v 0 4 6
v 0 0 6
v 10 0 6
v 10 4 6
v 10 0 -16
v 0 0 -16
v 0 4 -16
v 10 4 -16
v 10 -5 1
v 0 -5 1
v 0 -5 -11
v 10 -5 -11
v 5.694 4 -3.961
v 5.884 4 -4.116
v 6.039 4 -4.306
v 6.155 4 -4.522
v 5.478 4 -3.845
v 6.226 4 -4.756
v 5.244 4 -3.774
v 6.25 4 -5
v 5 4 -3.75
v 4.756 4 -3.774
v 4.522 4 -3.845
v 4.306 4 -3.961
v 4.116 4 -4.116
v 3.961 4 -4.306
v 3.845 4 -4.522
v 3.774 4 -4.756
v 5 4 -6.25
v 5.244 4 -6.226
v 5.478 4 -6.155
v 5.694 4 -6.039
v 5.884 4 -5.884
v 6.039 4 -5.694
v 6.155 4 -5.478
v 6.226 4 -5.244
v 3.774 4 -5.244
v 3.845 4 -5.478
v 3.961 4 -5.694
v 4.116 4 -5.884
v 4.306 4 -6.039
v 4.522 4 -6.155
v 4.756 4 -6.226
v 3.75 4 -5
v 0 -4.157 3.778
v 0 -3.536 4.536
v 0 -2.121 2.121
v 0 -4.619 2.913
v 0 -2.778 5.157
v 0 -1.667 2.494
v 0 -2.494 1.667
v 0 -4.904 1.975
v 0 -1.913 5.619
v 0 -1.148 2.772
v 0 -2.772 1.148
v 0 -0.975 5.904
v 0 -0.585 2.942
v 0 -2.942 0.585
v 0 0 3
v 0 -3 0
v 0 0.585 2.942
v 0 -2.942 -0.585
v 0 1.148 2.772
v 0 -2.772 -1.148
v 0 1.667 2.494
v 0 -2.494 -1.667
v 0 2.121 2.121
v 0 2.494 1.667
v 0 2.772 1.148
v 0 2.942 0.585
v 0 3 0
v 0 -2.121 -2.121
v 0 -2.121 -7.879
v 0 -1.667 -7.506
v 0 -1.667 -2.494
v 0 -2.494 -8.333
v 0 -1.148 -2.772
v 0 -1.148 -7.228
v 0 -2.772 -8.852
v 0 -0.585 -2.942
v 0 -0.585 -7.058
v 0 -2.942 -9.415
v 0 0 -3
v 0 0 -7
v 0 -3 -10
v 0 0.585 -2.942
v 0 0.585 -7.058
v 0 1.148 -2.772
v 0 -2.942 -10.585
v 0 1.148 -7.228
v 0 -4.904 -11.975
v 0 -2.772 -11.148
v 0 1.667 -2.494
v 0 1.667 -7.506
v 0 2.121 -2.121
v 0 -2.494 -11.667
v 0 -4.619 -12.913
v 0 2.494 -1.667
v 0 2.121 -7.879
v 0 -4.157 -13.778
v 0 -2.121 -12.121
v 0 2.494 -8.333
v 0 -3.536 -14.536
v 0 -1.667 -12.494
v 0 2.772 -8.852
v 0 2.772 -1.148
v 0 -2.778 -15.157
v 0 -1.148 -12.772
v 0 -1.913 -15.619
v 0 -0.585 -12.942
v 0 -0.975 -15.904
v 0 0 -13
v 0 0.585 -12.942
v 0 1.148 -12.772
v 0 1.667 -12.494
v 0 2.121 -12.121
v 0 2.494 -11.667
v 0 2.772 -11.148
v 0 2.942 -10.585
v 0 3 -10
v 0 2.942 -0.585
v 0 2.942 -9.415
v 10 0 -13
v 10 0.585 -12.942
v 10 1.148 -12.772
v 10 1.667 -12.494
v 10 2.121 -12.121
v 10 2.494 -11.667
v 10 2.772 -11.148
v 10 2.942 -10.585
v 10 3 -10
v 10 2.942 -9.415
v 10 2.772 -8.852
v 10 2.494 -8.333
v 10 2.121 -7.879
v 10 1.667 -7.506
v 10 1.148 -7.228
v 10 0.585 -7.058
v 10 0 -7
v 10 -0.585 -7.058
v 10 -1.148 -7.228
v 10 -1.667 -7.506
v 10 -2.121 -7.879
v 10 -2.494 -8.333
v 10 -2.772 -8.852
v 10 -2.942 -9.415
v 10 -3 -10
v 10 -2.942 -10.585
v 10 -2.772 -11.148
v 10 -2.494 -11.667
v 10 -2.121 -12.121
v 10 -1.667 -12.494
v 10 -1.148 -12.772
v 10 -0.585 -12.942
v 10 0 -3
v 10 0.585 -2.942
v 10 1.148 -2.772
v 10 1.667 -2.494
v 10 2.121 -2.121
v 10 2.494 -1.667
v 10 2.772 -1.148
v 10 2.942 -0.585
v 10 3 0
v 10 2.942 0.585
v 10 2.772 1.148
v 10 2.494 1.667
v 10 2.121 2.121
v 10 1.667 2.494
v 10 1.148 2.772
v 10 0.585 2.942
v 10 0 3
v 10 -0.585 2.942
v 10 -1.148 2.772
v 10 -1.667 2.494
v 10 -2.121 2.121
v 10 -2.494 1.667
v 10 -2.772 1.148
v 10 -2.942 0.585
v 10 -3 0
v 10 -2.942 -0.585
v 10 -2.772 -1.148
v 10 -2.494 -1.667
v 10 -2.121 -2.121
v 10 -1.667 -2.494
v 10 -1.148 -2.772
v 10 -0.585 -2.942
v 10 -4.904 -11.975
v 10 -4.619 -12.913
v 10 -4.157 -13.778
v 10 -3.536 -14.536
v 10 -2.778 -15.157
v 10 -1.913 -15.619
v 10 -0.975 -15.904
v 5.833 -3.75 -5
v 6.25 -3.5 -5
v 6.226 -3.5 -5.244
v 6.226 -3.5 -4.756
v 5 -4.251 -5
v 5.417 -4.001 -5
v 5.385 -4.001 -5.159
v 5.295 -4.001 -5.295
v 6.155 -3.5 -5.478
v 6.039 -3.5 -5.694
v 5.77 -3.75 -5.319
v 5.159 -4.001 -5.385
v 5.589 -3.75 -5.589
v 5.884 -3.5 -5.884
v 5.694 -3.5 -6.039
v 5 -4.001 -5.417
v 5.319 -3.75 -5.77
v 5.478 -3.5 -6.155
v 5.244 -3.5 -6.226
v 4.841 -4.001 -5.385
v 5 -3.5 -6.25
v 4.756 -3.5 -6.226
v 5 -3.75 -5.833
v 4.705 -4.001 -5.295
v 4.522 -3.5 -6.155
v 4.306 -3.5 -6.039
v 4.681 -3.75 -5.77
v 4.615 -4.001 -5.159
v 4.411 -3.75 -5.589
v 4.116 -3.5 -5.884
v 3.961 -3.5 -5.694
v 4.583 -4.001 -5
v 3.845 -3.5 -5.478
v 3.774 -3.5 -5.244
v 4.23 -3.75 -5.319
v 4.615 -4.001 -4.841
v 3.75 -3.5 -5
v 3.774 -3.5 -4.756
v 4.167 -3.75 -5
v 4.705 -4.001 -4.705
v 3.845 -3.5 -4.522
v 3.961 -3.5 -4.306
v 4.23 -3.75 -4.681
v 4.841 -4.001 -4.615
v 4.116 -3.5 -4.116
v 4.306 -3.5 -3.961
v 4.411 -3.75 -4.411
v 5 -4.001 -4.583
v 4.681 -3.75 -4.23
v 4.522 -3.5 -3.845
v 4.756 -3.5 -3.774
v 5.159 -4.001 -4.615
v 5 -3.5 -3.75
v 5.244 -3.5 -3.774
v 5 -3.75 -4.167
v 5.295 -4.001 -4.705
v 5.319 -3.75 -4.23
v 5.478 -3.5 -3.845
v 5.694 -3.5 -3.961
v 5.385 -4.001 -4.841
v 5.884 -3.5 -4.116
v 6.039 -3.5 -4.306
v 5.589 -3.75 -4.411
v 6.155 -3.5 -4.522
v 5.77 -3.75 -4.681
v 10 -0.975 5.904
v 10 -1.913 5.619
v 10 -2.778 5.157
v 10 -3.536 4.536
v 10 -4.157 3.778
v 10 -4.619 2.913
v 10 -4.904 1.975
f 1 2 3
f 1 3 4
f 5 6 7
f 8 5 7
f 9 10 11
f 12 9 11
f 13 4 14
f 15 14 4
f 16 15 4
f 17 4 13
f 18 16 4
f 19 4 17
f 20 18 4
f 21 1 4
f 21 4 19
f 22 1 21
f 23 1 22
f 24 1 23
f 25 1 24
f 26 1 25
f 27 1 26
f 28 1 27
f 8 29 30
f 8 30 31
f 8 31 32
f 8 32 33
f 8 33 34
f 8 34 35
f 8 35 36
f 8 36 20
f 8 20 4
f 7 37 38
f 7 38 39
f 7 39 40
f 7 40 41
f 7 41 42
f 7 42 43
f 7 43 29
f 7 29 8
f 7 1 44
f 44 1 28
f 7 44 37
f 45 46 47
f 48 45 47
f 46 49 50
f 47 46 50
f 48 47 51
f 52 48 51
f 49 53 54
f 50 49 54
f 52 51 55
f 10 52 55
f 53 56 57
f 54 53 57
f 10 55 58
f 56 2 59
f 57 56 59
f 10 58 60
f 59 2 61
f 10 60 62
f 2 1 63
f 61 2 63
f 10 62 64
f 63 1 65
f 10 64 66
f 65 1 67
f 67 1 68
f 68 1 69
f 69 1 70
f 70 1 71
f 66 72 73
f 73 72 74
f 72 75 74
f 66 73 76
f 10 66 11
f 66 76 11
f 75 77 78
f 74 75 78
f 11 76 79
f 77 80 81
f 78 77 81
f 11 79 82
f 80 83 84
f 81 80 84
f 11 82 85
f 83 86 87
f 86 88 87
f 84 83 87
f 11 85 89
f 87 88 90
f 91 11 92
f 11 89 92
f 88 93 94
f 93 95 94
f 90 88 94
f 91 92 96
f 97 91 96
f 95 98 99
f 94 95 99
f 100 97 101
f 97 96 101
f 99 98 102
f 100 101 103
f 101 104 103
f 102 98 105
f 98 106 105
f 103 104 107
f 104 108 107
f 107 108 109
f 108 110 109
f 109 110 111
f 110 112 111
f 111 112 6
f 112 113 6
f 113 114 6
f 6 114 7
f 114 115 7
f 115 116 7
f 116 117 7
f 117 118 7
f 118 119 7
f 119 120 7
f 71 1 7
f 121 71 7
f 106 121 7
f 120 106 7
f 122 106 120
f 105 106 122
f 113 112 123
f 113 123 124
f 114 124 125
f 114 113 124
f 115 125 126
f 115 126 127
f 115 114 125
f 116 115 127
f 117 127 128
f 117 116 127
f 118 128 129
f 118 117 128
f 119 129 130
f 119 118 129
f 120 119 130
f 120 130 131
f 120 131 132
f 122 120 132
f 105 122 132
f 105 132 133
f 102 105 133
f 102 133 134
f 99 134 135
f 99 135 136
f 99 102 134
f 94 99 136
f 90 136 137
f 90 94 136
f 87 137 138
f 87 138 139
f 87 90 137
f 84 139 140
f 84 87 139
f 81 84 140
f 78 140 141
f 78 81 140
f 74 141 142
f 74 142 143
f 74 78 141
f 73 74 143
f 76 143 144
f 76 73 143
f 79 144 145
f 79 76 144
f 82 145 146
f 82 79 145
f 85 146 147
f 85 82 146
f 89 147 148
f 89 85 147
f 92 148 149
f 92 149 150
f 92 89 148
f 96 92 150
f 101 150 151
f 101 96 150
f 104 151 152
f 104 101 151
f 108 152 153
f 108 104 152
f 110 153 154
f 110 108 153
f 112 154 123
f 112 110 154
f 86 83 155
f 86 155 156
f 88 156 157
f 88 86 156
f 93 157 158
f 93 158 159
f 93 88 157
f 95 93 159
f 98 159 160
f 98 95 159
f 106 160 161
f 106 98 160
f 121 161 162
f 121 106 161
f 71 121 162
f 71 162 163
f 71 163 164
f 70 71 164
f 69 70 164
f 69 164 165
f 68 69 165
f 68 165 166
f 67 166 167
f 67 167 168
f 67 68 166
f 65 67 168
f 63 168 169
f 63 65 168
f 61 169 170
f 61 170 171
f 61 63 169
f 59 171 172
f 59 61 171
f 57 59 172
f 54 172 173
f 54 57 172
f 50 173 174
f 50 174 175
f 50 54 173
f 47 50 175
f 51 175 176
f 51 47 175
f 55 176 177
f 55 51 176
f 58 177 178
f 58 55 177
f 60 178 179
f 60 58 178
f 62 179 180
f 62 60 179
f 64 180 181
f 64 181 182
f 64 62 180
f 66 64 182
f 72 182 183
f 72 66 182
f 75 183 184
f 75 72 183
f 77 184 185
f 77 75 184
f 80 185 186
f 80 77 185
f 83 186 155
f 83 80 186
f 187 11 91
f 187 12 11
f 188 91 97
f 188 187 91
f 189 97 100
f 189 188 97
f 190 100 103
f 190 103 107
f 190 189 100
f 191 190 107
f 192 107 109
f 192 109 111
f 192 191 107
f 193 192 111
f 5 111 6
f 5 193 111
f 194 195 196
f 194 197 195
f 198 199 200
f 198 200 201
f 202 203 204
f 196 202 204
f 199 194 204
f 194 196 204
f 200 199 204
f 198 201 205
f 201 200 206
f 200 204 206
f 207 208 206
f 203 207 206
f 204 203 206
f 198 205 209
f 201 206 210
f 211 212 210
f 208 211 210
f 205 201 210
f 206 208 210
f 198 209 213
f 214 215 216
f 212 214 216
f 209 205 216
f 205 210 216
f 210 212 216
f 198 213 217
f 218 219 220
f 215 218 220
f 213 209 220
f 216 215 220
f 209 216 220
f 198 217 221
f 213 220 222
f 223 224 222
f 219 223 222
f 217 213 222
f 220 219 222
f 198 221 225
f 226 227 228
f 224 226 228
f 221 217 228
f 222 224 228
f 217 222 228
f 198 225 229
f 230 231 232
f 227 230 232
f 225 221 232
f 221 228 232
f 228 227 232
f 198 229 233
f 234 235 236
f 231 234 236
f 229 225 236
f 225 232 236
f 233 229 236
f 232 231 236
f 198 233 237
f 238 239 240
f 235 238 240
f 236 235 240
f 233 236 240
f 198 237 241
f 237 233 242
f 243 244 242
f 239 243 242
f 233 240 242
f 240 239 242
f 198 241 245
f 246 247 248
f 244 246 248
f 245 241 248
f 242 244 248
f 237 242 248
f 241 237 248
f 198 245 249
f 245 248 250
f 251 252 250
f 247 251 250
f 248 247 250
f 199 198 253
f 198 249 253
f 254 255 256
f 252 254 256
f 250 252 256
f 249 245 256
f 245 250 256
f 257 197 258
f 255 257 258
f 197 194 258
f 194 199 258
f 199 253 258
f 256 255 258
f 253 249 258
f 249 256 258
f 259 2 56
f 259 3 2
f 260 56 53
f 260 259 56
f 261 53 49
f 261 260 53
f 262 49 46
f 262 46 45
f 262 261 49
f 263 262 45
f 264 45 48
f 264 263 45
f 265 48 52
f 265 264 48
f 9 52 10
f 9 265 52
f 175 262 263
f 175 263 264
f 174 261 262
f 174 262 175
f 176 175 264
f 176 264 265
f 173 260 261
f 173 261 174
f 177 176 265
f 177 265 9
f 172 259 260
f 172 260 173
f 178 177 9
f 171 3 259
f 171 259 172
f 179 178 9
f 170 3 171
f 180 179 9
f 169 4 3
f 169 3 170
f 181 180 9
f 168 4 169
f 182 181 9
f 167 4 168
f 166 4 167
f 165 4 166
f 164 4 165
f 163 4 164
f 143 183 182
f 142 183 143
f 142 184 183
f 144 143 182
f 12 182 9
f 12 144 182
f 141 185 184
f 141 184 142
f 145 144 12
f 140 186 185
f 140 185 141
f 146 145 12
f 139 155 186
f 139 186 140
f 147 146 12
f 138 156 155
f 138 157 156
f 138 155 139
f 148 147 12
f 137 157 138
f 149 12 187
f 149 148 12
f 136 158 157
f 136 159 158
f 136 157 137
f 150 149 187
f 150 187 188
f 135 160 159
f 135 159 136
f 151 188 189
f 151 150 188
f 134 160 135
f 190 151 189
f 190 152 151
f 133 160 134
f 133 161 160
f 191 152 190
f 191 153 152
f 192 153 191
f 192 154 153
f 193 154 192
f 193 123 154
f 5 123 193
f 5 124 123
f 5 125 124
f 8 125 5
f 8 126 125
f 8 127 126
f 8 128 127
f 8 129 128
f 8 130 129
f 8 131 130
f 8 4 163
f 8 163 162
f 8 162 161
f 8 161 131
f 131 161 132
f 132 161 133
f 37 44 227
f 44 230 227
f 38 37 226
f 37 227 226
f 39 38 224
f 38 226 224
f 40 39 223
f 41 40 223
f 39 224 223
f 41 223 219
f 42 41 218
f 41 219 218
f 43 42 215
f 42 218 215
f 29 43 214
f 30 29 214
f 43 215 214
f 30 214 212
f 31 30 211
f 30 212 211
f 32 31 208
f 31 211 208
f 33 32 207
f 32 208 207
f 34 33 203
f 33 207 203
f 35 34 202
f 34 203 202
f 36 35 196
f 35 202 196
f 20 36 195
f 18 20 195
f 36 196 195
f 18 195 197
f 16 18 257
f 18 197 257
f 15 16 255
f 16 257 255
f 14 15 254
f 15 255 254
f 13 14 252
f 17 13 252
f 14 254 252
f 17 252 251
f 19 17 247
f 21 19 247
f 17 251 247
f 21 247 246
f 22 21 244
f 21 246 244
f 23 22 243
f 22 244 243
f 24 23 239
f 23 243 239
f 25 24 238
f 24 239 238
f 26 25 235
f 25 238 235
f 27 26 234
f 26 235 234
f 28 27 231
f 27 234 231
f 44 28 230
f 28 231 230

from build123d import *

# Parameters (mm, degrees)
SKETCH1_W             = 22
SKETCH1_H             = 9
SKETCH1_R             = 3
BOSS_EXTRUDE1_DEPTH   = 10
FILLET1_R             = 5
M3_TAPPED_HOLE1_D     = 2.5
M3_TAPPED_HOLE1_DEPTH = 7.5
M3_TAPPED_HOLE1_TIP   = 0.751075774


with BuildPart() as part:
    # Sketch1 → Boss-Extrude1 (new body)
    with BuildSketch(Plane(origin=(0, 0, 0), x_dir=(0, 0, -1), z_dir=(1, 0, 0))):
        with Locations((5, -0.5)):
            Rectangle(SKETCH1_W, SKETCH1_H)
        Circle(SKETCH1_R, mode=Mode.SUBTRACT)
        with Locations((10, 0)):
            Circle(SKETCH1_R, mode=Mode.SUBTRACT)
    extrude(amount=BOSS_EXTRUDE1_DEPTH)

    # Fillet1
    fillet1_edges = [part.edges().sort_by_distance(p)[0] for p in [
        (5, -5, -16),
        (5, -5, 6),
    ]]
    fillet(fillet1_edges, radius=FILLET1_R)

    # M3 Tapped Hole1
    with Locations(Plane(origin=(0, 4, 0), x_dir=(1, 0, 0), z_dir=(0, 1, 0))):
        with Locations((5, 5)):
            Hole(M3_TAPPED_HOLE1_D / 2, depth=M3_TAPPED_HOLE1_DEPTH)
            with Locations((0, 0, -(M3_TAPPED_HOLE1_DEPTH + M3_TAPPED_HOLE1_TIP / 2))):  # 118° drill point
                Cone(0, M3_TAPPED_HOLE1_D / 2, M3_TAPPED_HOLE1_TIP, mode=Mode.SUBTRACT)


solid = part.part
